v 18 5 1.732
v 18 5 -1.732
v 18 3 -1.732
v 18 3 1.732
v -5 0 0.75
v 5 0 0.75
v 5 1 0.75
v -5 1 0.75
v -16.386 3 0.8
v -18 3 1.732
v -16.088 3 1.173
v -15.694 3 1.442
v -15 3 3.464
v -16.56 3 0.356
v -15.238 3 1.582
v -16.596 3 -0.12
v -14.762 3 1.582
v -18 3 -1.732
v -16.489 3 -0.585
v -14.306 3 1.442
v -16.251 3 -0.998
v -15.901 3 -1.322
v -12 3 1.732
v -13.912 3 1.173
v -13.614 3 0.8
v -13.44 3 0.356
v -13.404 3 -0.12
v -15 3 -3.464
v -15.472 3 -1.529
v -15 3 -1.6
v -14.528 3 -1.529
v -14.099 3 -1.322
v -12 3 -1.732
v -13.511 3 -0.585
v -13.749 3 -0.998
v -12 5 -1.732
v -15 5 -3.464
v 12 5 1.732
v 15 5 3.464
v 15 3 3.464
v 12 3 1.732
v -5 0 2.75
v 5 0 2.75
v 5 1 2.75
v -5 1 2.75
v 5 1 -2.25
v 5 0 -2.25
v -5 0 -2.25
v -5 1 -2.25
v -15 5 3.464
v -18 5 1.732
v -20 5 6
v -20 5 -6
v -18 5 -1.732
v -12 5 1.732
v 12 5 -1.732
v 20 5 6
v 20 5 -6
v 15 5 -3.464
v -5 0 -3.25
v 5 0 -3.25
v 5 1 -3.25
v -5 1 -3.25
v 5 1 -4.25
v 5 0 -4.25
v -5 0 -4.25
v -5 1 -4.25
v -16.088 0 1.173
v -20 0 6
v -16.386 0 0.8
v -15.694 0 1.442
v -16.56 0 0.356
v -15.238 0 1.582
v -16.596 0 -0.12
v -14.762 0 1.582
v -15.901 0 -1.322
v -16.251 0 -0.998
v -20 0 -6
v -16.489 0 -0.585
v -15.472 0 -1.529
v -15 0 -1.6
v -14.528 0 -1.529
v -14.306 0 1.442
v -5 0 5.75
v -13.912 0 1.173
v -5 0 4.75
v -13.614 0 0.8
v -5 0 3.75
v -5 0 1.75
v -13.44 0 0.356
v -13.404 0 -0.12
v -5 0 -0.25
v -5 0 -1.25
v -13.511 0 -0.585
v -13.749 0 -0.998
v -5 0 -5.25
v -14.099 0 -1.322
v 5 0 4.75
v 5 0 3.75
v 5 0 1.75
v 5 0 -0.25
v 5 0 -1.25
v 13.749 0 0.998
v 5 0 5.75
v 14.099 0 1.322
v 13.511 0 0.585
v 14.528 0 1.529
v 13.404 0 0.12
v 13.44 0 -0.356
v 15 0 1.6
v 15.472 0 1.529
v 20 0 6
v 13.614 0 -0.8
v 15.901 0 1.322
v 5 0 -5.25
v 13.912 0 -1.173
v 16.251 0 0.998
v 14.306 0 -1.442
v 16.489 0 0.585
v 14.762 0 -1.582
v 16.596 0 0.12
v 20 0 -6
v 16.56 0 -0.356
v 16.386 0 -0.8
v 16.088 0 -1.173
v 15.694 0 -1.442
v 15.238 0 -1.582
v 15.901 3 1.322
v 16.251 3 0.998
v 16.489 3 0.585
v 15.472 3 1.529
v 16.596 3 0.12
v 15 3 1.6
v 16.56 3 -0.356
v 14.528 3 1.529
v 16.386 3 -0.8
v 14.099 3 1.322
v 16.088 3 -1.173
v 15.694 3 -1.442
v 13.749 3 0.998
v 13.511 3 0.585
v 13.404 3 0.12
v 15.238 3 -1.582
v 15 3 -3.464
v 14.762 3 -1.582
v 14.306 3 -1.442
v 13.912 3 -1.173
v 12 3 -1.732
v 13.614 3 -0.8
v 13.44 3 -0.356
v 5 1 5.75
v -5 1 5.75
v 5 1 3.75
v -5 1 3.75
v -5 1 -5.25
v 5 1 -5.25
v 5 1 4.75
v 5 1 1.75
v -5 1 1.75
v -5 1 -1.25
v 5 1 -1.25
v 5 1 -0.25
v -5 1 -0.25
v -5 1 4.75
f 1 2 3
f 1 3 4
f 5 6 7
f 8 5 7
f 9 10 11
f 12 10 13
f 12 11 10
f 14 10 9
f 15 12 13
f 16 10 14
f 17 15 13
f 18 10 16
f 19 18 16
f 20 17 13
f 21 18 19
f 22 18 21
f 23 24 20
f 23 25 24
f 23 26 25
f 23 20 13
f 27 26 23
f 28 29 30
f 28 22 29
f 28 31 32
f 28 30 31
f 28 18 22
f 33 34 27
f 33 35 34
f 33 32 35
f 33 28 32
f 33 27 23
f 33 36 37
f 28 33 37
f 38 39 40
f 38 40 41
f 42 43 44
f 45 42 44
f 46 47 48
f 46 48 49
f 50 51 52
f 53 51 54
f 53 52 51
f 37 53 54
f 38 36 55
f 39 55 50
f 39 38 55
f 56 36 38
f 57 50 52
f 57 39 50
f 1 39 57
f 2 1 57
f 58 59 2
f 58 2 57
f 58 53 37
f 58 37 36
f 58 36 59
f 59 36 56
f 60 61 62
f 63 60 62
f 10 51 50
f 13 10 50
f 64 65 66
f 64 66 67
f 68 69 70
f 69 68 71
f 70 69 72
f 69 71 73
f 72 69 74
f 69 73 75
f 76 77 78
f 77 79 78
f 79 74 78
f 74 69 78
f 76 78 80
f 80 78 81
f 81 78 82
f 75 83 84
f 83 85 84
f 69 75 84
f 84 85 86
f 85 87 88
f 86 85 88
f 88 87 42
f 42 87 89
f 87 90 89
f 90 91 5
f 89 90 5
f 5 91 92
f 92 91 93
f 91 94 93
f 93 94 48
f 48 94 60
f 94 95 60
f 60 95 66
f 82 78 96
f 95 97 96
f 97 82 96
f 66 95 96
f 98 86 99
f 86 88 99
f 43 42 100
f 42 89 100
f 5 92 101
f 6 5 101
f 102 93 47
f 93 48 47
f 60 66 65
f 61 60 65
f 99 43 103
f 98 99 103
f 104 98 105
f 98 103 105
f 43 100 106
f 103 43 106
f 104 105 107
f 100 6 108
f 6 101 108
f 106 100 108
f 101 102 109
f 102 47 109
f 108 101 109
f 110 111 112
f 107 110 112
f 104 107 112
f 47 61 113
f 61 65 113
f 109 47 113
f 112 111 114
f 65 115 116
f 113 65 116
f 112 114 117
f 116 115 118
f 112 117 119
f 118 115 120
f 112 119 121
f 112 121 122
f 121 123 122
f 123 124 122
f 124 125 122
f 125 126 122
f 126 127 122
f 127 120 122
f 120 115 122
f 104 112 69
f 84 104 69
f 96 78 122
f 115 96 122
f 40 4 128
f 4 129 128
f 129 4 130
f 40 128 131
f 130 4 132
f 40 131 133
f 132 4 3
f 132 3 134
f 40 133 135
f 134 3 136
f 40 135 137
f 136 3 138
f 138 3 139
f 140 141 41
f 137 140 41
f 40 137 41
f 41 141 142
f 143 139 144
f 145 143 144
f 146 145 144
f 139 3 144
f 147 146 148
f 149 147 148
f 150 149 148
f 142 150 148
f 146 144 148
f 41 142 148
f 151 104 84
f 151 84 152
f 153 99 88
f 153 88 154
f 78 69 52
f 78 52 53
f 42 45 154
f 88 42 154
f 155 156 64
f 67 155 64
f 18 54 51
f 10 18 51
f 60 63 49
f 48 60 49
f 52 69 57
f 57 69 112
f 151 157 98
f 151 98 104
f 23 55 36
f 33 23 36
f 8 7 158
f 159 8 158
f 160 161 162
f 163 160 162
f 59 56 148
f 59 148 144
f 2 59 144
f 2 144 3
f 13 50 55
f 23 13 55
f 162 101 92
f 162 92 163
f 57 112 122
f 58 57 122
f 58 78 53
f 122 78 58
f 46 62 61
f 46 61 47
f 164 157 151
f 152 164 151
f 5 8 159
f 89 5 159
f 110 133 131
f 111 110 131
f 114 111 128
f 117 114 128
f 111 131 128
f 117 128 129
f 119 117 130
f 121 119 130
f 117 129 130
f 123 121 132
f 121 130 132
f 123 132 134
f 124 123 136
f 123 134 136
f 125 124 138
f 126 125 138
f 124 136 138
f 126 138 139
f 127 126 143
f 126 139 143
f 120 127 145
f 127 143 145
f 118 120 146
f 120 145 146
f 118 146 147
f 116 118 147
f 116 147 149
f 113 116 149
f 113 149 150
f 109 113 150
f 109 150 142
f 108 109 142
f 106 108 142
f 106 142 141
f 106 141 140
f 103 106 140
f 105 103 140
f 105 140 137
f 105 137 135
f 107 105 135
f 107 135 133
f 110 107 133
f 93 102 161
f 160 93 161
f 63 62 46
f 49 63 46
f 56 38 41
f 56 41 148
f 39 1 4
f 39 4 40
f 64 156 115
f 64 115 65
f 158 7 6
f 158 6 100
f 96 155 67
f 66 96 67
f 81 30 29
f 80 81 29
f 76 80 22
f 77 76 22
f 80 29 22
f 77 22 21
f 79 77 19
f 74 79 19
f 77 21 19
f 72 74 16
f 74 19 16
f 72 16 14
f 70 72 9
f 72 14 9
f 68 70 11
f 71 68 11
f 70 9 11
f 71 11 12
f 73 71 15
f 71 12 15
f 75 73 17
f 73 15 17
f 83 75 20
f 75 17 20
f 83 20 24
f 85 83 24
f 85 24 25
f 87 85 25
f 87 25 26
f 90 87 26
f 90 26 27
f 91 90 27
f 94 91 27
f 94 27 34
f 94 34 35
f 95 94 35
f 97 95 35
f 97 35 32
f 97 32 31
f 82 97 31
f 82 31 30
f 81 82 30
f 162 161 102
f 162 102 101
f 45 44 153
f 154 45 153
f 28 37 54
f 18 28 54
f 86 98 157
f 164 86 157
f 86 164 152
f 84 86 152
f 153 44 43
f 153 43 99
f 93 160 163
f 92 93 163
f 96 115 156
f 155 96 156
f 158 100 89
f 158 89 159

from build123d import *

# Parameters (mm, degrees)
SKETCH1_W           = 40
SKETCH1_H           = 12
BOSS_EXTRUDE1_DEPTH = 5
SKETCH2_R           = 1.6
CUT_EXTRUDE2_DEPTH  = 22.470910554
TEETH_DEPTH         = 5
TEETH_DEPTH_BACK    = 5
TEETH_START         = -20
SKETCH3_W           = 1
SKETCH3_H           = 1
CUT_EXTRUDE4_DEPTH  = 2


with BuildPart() as part:
    # Sketch1 → Boss-Extrude1 (new body)
    with BuildSketch(Plane(origin=(0, 0, 0), x_dir=(1, 0, 0), z_dir=(0, 1, 0))):
        Rectangle(SKETCH1_W, SKETCH1_H)
    extrude(amount=BOSS_EXTRUDE1_DEPTH)

    # Sketch2 → Cut-Extrude2 (cut, through all)
    with BuildSketch(Plane(origin=(0, 5, 0), x_dir=(1, 0, 0), z_dir=(0, 1, 0))):
        with Locations(Location((15, 0, 0), (0, 0, 270))):
            Circle(SKETCH2_R)
        with Locations(Location((-15, 0, 0), (0, 0, 90))):
            Circle(SKETCH2_R)
    extrude(amount=-CUT_EXTRUDE2_DEPTH, mode=Mode.SUBTRACT)

    # Sketch3 → Teeth (cut, two sides: drawn at the far end of the back side and taken through both)
    with BuildSketch(Plane.ZY.offset(20).offset(TEETH_START - TEETH_DEPTH_BACK)):
        with Locations((-4.75, 0.5)):
            Rectangle(SKETCH3_W, SKETCH3_H)
        with Locations((-2.75, 0.5)):
            Rectangle(SKETCH3_W, SKETCH3_H)
        with Locations((-0.75, 0.5)):
            Rectangle(SKETCH3_W, SKETCH3_H)
        with Locations((1.25, 0.5)):
            Rectangle(SKETCH3_W, SKETCH3_H)
        with Locations((3.25, 0.5)):
            Rectangle(SKETCH3_W, SKETCH3_H)
        with Locations((5.25, 0.5)):
            Rectangle(SKETCH3_W, SKETCH3_H)
        with Locations((7.25, 0.5)):
            Rectangle(SKETCH3_W, SKETCH3_H)
        with Locations((9.25, 0.5)):
            Rectangle(SKETCH3_W, SKETCH3_H)
    extrude(amount=TEETH_DEPTH + TEETH_DEPTH_BACK, mode=Mode.SUBTRACT)

    # Sketch4 → Cut-Extrude4 (cut)
    with BuildSketch(Plane(origin=(0, 5, 0), x_dir=(1, 0, 0), z_dir=(0, 1, 0))):
        Polygon((-15, 3.464101615), (-18, 1.732050808), (-18, -1.732050808), (-15, -3.464101615), (-12, -1.732050808), (-12, 1.732050808), align=None)
        Polygon((12, 1.732050808), (15, 3.464101615), (18, 1.732050808), (18, -1.732050808), (15, -3.464101615), (12, -1.732050808), align=None)
    extrude(amount=-CUT_EXTRUDE4_DEPTH, mode=Mode.SUBTRACT)


solid = part.part
